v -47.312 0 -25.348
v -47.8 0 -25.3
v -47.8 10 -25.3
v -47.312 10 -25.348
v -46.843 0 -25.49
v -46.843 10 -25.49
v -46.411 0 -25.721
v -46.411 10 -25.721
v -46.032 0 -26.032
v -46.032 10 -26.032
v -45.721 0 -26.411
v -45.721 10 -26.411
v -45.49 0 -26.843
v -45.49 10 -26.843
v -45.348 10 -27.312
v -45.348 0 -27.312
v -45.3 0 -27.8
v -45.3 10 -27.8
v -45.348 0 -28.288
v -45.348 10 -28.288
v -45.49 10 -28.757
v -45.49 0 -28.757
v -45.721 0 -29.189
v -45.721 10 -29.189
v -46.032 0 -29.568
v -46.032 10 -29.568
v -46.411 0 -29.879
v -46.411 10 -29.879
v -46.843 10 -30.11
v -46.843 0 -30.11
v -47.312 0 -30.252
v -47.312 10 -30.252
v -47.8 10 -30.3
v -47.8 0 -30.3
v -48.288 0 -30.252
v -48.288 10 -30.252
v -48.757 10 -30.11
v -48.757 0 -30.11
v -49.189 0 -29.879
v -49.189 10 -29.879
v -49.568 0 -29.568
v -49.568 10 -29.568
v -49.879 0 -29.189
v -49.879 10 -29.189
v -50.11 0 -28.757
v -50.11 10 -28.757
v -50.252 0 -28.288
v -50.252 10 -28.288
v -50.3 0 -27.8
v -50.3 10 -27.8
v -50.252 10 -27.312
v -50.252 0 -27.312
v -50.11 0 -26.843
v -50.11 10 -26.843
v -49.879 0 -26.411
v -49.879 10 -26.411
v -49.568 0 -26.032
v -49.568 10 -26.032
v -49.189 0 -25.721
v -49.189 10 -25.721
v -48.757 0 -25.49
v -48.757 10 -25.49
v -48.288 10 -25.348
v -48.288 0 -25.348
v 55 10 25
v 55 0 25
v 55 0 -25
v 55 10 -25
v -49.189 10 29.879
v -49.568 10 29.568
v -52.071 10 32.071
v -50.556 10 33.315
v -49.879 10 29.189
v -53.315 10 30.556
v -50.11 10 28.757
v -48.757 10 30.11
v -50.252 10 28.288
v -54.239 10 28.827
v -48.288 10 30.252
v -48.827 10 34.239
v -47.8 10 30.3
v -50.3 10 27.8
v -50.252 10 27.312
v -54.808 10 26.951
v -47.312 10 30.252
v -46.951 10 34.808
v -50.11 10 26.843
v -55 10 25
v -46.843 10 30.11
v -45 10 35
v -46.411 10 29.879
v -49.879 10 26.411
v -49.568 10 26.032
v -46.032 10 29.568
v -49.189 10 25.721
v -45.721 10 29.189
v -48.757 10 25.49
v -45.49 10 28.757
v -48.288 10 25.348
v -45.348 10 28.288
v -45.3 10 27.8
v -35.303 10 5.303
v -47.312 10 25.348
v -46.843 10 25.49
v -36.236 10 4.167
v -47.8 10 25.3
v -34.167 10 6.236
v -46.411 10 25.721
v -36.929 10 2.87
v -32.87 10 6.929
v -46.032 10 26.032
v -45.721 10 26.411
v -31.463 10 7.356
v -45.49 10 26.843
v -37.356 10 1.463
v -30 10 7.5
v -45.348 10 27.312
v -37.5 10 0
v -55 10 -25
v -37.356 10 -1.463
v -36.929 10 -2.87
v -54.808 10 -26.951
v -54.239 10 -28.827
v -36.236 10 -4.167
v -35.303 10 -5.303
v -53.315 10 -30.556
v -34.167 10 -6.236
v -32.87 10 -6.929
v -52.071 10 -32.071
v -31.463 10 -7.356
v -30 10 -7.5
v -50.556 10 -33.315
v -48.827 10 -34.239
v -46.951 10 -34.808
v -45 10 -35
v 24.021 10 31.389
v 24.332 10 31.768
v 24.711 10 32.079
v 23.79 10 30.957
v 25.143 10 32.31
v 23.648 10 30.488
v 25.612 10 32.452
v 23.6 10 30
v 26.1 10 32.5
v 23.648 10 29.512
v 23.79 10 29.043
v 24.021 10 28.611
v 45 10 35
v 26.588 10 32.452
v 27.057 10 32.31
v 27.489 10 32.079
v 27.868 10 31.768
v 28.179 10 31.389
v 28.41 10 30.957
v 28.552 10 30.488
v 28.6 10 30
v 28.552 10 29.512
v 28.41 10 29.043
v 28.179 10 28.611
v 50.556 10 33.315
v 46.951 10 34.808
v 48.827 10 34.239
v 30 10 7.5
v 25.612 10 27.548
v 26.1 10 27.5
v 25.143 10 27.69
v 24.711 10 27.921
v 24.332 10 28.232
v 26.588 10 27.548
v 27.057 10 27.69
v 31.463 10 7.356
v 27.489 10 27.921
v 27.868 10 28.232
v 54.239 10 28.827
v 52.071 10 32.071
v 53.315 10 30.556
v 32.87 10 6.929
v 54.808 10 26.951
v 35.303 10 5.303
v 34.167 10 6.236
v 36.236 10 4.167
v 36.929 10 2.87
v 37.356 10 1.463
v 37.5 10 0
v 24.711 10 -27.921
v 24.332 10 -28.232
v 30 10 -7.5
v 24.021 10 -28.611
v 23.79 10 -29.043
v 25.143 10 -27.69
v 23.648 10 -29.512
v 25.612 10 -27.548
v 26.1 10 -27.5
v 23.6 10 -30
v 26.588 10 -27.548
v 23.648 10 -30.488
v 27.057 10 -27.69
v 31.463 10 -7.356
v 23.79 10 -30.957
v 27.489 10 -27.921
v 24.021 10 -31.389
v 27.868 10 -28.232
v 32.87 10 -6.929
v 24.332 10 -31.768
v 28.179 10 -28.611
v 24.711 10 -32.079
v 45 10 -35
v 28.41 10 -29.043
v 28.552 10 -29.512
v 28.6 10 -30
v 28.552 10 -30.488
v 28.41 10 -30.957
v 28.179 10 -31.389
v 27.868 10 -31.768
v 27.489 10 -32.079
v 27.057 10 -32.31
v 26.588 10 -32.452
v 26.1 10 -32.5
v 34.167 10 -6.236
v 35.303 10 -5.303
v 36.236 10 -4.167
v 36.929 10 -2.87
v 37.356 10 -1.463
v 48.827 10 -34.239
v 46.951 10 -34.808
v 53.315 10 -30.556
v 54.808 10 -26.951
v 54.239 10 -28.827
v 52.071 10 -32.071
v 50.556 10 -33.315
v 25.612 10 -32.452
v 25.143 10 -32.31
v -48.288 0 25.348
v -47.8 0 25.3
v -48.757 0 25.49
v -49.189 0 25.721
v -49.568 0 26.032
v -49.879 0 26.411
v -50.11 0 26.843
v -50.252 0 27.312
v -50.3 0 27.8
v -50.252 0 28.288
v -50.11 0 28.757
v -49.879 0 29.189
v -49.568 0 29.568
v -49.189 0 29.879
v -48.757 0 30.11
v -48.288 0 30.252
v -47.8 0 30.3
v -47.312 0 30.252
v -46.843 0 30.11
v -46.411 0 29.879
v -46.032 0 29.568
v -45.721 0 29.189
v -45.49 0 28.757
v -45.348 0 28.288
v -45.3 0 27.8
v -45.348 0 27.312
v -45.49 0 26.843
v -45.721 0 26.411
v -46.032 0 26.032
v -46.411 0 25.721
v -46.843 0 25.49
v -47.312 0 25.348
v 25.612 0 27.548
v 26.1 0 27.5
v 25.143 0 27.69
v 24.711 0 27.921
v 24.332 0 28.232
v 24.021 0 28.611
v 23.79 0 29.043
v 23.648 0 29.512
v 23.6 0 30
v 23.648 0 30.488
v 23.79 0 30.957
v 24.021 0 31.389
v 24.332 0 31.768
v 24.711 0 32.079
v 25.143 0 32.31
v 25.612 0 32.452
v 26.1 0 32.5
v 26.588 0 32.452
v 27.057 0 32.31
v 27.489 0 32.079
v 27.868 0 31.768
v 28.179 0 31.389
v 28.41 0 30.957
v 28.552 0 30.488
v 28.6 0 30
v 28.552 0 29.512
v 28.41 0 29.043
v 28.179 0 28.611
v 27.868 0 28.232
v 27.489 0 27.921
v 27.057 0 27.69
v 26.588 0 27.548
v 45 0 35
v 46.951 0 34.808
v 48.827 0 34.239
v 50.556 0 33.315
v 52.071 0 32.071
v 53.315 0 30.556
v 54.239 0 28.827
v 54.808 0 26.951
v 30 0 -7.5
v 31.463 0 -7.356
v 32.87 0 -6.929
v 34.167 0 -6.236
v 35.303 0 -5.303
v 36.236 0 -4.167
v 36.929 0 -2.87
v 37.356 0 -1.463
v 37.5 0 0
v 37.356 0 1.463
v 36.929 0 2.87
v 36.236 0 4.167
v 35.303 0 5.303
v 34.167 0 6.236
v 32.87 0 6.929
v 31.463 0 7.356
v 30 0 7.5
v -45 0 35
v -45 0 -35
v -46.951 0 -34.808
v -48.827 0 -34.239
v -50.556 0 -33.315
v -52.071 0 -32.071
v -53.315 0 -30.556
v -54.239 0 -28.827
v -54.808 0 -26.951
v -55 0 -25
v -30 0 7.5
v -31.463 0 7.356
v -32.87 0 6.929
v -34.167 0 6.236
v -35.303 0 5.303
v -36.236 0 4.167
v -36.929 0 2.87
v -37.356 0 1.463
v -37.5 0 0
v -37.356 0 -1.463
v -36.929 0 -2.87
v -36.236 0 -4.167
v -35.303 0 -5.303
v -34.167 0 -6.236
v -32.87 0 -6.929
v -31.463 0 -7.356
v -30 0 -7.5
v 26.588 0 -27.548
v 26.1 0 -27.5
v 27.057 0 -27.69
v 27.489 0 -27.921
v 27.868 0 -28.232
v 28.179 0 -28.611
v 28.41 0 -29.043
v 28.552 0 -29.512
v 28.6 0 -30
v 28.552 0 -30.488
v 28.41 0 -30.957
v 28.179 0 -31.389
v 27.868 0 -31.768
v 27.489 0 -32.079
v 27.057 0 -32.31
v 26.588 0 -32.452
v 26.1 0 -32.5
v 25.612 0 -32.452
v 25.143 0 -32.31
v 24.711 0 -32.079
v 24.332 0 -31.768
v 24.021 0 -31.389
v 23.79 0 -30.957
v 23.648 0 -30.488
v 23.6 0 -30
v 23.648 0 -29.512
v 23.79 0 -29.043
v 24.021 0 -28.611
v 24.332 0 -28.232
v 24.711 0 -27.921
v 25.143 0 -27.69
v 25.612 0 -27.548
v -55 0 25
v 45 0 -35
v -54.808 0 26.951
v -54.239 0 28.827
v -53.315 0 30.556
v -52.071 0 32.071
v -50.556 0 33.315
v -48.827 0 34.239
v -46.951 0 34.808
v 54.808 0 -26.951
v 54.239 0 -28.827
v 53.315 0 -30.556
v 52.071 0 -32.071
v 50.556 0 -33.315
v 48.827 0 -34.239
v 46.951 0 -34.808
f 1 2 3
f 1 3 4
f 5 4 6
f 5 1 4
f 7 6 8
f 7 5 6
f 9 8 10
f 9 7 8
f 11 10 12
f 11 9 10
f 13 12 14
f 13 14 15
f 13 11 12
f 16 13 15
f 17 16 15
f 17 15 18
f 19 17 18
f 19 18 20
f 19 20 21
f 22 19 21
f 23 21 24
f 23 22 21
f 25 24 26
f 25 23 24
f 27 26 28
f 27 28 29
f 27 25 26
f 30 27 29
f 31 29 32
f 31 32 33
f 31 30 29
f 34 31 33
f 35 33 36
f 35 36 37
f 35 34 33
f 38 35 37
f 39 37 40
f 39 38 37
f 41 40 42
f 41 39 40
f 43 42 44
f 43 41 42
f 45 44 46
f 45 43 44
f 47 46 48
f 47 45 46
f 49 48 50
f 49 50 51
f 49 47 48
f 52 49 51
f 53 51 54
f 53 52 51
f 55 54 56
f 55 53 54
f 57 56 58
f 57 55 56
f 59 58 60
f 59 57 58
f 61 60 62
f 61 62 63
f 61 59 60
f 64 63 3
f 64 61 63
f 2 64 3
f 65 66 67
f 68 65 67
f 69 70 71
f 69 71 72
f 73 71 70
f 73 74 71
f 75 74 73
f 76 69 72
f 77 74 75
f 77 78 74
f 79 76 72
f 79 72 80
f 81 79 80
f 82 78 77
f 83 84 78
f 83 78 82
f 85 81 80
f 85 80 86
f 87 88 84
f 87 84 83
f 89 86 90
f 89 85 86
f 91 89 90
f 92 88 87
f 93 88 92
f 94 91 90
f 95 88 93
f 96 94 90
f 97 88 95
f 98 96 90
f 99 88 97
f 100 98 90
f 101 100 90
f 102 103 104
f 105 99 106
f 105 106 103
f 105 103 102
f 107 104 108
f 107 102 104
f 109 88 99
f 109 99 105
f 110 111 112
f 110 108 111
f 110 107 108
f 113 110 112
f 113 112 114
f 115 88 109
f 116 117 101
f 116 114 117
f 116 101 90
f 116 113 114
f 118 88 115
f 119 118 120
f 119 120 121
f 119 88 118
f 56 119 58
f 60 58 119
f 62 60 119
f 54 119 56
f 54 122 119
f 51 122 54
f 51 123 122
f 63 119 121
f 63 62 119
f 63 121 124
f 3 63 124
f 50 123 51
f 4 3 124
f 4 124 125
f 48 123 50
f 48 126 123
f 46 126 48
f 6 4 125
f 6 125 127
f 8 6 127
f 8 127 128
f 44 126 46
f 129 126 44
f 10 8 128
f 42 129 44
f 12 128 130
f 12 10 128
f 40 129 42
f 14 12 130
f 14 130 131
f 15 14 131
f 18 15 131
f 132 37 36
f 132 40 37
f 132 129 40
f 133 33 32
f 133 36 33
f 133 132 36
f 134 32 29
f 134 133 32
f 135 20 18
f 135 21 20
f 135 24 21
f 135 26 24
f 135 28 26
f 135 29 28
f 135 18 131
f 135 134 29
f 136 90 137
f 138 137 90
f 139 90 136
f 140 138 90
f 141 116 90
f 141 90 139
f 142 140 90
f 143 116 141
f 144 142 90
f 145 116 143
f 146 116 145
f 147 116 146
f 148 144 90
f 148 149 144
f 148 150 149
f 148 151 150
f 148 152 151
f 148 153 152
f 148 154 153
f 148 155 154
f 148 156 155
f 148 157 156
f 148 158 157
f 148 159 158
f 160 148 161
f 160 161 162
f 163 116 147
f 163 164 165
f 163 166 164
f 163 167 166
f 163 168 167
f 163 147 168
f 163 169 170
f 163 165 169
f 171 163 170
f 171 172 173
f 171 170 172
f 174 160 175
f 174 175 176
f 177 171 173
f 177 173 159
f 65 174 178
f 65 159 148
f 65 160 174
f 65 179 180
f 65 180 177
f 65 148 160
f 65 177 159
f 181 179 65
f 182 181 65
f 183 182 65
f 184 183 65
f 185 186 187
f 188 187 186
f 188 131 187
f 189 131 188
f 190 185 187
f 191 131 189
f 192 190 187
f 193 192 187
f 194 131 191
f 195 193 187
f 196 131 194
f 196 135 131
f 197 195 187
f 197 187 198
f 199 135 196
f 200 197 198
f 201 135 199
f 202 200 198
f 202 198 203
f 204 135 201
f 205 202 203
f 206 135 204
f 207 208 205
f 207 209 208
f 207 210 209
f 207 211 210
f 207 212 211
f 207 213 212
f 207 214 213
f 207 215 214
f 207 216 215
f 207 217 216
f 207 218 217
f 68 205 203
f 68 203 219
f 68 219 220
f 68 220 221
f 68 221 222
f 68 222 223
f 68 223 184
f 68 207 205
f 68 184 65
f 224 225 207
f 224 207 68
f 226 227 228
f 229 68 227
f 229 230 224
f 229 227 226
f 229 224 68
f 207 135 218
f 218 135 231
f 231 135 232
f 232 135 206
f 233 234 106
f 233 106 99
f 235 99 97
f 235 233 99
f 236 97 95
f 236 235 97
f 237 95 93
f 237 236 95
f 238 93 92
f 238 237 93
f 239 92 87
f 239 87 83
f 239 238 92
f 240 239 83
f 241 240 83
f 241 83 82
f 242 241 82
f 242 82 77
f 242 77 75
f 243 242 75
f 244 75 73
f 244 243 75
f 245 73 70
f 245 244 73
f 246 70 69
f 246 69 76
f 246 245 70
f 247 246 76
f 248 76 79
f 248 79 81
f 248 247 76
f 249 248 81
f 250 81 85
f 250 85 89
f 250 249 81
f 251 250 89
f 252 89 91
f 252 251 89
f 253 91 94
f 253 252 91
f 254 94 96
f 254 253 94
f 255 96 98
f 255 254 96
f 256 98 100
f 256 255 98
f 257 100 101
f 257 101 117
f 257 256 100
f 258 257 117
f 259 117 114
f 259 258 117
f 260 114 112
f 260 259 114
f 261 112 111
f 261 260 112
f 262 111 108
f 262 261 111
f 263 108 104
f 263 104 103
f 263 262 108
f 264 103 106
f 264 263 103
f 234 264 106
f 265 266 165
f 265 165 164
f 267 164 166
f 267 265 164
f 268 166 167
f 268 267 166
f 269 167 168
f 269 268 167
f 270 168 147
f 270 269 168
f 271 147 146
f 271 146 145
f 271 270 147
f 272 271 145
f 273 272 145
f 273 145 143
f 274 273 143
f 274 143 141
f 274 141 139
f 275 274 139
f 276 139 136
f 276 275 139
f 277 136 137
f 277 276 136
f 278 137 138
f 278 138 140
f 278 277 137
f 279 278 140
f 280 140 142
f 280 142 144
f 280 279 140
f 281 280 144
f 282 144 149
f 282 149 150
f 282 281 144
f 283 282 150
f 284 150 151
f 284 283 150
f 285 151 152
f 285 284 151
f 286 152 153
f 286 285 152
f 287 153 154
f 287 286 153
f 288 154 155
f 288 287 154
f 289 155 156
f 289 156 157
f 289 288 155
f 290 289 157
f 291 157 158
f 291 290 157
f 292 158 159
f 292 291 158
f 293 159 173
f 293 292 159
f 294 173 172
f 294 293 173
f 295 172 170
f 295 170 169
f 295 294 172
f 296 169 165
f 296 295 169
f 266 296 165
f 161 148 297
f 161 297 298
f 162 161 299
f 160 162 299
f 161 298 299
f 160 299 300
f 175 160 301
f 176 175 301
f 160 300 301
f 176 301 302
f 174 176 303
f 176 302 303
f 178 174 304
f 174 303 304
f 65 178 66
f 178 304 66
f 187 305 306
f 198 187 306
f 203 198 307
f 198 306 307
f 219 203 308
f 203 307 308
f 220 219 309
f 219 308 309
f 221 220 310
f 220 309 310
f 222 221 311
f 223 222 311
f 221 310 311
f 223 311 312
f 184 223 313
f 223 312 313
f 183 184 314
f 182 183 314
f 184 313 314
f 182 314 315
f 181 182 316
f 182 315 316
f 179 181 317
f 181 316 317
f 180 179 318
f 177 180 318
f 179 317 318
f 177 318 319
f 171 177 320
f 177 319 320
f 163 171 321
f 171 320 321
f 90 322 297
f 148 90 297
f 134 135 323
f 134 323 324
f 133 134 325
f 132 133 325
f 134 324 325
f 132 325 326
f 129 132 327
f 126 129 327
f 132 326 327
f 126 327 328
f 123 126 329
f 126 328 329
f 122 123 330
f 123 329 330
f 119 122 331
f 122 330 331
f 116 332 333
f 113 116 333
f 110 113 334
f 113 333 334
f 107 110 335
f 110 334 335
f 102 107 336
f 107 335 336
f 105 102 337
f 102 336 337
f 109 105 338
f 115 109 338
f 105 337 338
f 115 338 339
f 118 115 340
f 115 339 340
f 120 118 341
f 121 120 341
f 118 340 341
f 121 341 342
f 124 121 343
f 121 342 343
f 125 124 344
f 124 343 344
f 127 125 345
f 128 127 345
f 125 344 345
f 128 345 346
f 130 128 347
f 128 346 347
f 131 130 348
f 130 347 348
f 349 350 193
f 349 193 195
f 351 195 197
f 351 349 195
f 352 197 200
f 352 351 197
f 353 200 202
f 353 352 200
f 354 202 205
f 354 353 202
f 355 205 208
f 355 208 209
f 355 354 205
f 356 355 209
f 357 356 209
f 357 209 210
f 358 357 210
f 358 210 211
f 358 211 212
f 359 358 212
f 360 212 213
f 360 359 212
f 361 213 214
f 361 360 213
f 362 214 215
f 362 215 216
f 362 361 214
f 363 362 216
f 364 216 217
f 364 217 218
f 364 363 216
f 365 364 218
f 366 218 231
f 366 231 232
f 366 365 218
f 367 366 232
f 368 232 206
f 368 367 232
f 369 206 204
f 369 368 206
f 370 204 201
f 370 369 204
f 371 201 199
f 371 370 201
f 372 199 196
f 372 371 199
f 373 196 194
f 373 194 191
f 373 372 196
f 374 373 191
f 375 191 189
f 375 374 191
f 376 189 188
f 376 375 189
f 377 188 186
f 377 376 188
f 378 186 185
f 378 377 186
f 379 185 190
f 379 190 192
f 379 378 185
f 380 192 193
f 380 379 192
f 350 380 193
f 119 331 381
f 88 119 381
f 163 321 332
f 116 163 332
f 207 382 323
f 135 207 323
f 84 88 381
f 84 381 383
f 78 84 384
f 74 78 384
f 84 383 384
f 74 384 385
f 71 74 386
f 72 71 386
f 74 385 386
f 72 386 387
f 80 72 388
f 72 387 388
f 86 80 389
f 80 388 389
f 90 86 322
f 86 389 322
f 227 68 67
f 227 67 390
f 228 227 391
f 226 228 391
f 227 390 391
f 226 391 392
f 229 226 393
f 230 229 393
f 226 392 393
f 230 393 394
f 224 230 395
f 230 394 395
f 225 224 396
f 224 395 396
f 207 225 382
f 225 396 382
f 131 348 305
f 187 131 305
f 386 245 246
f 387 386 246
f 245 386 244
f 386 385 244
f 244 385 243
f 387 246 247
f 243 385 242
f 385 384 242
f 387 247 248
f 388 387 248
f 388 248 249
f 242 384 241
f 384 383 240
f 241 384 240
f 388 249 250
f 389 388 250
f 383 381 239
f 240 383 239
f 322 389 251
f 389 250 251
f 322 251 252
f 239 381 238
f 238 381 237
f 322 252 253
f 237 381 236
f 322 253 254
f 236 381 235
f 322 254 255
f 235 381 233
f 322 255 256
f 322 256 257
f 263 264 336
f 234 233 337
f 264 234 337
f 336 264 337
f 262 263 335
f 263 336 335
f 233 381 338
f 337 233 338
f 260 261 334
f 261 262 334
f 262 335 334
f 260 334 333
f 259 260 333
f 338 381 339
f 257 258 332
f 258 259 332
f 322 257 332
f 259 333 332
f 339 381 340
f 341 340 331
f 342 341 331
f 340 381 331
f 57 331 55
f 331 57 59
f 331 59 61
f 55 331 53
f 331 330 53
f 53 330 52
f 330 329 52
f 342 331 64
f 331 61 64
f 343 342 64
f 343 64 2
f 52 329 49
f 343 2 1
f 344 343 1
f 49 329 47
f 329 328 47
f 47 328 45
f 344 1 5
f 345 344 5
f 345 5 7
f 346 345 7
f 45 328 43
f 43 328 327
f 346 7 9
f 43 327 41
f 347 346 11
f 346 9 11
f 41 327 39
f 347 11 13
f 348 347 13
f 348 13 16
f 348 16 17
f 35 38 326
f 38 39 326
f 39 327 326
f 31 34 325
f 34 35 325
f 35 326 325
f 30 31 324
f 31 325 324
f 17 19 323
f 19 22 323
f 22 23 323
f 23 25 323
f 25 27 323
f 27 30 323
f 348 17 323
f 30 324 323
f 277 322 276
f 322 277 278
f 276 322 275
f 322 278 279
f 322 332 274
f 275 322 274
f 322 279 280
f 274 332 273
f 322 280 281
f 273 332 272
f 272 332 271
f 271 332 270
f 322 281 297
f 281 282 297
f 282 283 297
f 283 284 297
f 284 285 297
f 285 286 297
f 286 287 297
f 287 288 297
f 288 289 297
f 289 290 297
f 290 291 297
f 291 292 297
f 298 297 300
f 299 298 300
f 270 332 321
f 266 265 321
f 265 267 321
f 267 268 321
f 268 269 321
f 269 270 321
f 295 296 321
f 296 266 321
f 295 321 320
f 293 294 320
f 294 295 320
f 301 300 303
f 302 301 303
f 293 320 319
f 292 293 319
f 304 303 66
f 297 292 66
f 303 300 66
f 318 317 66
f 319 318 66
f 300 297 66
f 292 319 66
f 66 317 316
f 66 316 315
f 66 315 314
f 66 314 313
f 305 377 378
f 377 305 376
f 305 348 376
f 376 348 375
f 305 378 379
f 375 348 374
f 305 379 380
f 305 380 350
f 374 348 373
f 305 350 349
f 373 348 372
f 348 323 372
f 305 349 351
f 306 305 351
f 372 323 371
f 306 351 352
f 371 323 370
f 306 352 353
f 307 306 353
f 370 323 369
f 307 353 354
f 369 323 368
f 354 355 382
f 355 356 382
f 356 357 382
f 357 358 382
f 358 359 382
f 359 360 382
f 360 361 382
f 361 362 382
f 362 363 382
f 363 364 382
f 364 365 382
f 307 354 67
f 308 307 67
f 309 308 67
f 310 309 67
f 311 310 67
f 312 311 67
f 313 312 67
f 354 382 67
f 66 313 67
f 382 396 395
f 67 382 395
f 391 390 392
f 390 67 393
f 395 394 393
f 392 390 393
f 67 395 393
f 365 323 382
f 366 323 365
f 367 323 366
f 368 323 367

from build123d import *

# Parameters (mm, degrees)
SKETCH1_R           = 2.5
BOSS_EXTRUDE1_DEPTH = 10


with BuildPart() as part:
    # Sketch1 → Boss-Extrude1 (new body)
    with BuildSketch(Plane(origin=(0, 0, 0), x_dir=(1, 0, 0), z_dir=(0, 1, 0))):
        with BuildLine():
            Line((-45, -35), (45, -35))
            ThreePointArc((45, -35), (52.071067812, -32.071067812), (55, -25))
            Line((55, -25), (55, 25))
            ThreePointArc((55, 25), (52.071067812, 32.071067812), (45, 35))
            Line((45, 35), (-45, 35))
            ThreePointArc((-45, 35), (-52.071067812, 32.071067812), (-55, 25))
            Line((-55, 25), (-55, -25))
            ThreePointArc((-55, -25), (-52.071067812, -32.071067812), (-45, -35))
        make_face()
        with Locations(Location((-47.8, 27.8, 0), (0, 0, 270))):
            Circle(SKETCH1_R, mode=Mode.SUBTRACT)
        with Locations(Location((-47.8, -27.8, 0), (0, 0, 90))):
            Circle(SKETCH1_R, mode=Mode.SUBTRACT)
        with Locations(Location((26.1, 30, 0), (0, 0, 270))):
            Circle(SKETCH1_R, mode=Mode.SUBTRACT)
        with Locations(Location((26.1, -30, 0), (0, 0, 90))):
            Circle(SKETCH1_R, mode=Mode.SUBTRACT)
        with BuildLine():
            Line((-30, 7.5), (30, 7.5))
            ThreePointArc((30, 7.5), (37.5, 0), (30, -7.5))
            Line((30, -7.5), (-30, -7.5))
            ThreePointArc((-30, -7.5), (-37.5, 0), (-30, 7.5))
        make_face(mode=Mode.SUBTRACT)
    extrude(amount=BOSS_EXTRUDE1_DEPTH)


solid = part.part
